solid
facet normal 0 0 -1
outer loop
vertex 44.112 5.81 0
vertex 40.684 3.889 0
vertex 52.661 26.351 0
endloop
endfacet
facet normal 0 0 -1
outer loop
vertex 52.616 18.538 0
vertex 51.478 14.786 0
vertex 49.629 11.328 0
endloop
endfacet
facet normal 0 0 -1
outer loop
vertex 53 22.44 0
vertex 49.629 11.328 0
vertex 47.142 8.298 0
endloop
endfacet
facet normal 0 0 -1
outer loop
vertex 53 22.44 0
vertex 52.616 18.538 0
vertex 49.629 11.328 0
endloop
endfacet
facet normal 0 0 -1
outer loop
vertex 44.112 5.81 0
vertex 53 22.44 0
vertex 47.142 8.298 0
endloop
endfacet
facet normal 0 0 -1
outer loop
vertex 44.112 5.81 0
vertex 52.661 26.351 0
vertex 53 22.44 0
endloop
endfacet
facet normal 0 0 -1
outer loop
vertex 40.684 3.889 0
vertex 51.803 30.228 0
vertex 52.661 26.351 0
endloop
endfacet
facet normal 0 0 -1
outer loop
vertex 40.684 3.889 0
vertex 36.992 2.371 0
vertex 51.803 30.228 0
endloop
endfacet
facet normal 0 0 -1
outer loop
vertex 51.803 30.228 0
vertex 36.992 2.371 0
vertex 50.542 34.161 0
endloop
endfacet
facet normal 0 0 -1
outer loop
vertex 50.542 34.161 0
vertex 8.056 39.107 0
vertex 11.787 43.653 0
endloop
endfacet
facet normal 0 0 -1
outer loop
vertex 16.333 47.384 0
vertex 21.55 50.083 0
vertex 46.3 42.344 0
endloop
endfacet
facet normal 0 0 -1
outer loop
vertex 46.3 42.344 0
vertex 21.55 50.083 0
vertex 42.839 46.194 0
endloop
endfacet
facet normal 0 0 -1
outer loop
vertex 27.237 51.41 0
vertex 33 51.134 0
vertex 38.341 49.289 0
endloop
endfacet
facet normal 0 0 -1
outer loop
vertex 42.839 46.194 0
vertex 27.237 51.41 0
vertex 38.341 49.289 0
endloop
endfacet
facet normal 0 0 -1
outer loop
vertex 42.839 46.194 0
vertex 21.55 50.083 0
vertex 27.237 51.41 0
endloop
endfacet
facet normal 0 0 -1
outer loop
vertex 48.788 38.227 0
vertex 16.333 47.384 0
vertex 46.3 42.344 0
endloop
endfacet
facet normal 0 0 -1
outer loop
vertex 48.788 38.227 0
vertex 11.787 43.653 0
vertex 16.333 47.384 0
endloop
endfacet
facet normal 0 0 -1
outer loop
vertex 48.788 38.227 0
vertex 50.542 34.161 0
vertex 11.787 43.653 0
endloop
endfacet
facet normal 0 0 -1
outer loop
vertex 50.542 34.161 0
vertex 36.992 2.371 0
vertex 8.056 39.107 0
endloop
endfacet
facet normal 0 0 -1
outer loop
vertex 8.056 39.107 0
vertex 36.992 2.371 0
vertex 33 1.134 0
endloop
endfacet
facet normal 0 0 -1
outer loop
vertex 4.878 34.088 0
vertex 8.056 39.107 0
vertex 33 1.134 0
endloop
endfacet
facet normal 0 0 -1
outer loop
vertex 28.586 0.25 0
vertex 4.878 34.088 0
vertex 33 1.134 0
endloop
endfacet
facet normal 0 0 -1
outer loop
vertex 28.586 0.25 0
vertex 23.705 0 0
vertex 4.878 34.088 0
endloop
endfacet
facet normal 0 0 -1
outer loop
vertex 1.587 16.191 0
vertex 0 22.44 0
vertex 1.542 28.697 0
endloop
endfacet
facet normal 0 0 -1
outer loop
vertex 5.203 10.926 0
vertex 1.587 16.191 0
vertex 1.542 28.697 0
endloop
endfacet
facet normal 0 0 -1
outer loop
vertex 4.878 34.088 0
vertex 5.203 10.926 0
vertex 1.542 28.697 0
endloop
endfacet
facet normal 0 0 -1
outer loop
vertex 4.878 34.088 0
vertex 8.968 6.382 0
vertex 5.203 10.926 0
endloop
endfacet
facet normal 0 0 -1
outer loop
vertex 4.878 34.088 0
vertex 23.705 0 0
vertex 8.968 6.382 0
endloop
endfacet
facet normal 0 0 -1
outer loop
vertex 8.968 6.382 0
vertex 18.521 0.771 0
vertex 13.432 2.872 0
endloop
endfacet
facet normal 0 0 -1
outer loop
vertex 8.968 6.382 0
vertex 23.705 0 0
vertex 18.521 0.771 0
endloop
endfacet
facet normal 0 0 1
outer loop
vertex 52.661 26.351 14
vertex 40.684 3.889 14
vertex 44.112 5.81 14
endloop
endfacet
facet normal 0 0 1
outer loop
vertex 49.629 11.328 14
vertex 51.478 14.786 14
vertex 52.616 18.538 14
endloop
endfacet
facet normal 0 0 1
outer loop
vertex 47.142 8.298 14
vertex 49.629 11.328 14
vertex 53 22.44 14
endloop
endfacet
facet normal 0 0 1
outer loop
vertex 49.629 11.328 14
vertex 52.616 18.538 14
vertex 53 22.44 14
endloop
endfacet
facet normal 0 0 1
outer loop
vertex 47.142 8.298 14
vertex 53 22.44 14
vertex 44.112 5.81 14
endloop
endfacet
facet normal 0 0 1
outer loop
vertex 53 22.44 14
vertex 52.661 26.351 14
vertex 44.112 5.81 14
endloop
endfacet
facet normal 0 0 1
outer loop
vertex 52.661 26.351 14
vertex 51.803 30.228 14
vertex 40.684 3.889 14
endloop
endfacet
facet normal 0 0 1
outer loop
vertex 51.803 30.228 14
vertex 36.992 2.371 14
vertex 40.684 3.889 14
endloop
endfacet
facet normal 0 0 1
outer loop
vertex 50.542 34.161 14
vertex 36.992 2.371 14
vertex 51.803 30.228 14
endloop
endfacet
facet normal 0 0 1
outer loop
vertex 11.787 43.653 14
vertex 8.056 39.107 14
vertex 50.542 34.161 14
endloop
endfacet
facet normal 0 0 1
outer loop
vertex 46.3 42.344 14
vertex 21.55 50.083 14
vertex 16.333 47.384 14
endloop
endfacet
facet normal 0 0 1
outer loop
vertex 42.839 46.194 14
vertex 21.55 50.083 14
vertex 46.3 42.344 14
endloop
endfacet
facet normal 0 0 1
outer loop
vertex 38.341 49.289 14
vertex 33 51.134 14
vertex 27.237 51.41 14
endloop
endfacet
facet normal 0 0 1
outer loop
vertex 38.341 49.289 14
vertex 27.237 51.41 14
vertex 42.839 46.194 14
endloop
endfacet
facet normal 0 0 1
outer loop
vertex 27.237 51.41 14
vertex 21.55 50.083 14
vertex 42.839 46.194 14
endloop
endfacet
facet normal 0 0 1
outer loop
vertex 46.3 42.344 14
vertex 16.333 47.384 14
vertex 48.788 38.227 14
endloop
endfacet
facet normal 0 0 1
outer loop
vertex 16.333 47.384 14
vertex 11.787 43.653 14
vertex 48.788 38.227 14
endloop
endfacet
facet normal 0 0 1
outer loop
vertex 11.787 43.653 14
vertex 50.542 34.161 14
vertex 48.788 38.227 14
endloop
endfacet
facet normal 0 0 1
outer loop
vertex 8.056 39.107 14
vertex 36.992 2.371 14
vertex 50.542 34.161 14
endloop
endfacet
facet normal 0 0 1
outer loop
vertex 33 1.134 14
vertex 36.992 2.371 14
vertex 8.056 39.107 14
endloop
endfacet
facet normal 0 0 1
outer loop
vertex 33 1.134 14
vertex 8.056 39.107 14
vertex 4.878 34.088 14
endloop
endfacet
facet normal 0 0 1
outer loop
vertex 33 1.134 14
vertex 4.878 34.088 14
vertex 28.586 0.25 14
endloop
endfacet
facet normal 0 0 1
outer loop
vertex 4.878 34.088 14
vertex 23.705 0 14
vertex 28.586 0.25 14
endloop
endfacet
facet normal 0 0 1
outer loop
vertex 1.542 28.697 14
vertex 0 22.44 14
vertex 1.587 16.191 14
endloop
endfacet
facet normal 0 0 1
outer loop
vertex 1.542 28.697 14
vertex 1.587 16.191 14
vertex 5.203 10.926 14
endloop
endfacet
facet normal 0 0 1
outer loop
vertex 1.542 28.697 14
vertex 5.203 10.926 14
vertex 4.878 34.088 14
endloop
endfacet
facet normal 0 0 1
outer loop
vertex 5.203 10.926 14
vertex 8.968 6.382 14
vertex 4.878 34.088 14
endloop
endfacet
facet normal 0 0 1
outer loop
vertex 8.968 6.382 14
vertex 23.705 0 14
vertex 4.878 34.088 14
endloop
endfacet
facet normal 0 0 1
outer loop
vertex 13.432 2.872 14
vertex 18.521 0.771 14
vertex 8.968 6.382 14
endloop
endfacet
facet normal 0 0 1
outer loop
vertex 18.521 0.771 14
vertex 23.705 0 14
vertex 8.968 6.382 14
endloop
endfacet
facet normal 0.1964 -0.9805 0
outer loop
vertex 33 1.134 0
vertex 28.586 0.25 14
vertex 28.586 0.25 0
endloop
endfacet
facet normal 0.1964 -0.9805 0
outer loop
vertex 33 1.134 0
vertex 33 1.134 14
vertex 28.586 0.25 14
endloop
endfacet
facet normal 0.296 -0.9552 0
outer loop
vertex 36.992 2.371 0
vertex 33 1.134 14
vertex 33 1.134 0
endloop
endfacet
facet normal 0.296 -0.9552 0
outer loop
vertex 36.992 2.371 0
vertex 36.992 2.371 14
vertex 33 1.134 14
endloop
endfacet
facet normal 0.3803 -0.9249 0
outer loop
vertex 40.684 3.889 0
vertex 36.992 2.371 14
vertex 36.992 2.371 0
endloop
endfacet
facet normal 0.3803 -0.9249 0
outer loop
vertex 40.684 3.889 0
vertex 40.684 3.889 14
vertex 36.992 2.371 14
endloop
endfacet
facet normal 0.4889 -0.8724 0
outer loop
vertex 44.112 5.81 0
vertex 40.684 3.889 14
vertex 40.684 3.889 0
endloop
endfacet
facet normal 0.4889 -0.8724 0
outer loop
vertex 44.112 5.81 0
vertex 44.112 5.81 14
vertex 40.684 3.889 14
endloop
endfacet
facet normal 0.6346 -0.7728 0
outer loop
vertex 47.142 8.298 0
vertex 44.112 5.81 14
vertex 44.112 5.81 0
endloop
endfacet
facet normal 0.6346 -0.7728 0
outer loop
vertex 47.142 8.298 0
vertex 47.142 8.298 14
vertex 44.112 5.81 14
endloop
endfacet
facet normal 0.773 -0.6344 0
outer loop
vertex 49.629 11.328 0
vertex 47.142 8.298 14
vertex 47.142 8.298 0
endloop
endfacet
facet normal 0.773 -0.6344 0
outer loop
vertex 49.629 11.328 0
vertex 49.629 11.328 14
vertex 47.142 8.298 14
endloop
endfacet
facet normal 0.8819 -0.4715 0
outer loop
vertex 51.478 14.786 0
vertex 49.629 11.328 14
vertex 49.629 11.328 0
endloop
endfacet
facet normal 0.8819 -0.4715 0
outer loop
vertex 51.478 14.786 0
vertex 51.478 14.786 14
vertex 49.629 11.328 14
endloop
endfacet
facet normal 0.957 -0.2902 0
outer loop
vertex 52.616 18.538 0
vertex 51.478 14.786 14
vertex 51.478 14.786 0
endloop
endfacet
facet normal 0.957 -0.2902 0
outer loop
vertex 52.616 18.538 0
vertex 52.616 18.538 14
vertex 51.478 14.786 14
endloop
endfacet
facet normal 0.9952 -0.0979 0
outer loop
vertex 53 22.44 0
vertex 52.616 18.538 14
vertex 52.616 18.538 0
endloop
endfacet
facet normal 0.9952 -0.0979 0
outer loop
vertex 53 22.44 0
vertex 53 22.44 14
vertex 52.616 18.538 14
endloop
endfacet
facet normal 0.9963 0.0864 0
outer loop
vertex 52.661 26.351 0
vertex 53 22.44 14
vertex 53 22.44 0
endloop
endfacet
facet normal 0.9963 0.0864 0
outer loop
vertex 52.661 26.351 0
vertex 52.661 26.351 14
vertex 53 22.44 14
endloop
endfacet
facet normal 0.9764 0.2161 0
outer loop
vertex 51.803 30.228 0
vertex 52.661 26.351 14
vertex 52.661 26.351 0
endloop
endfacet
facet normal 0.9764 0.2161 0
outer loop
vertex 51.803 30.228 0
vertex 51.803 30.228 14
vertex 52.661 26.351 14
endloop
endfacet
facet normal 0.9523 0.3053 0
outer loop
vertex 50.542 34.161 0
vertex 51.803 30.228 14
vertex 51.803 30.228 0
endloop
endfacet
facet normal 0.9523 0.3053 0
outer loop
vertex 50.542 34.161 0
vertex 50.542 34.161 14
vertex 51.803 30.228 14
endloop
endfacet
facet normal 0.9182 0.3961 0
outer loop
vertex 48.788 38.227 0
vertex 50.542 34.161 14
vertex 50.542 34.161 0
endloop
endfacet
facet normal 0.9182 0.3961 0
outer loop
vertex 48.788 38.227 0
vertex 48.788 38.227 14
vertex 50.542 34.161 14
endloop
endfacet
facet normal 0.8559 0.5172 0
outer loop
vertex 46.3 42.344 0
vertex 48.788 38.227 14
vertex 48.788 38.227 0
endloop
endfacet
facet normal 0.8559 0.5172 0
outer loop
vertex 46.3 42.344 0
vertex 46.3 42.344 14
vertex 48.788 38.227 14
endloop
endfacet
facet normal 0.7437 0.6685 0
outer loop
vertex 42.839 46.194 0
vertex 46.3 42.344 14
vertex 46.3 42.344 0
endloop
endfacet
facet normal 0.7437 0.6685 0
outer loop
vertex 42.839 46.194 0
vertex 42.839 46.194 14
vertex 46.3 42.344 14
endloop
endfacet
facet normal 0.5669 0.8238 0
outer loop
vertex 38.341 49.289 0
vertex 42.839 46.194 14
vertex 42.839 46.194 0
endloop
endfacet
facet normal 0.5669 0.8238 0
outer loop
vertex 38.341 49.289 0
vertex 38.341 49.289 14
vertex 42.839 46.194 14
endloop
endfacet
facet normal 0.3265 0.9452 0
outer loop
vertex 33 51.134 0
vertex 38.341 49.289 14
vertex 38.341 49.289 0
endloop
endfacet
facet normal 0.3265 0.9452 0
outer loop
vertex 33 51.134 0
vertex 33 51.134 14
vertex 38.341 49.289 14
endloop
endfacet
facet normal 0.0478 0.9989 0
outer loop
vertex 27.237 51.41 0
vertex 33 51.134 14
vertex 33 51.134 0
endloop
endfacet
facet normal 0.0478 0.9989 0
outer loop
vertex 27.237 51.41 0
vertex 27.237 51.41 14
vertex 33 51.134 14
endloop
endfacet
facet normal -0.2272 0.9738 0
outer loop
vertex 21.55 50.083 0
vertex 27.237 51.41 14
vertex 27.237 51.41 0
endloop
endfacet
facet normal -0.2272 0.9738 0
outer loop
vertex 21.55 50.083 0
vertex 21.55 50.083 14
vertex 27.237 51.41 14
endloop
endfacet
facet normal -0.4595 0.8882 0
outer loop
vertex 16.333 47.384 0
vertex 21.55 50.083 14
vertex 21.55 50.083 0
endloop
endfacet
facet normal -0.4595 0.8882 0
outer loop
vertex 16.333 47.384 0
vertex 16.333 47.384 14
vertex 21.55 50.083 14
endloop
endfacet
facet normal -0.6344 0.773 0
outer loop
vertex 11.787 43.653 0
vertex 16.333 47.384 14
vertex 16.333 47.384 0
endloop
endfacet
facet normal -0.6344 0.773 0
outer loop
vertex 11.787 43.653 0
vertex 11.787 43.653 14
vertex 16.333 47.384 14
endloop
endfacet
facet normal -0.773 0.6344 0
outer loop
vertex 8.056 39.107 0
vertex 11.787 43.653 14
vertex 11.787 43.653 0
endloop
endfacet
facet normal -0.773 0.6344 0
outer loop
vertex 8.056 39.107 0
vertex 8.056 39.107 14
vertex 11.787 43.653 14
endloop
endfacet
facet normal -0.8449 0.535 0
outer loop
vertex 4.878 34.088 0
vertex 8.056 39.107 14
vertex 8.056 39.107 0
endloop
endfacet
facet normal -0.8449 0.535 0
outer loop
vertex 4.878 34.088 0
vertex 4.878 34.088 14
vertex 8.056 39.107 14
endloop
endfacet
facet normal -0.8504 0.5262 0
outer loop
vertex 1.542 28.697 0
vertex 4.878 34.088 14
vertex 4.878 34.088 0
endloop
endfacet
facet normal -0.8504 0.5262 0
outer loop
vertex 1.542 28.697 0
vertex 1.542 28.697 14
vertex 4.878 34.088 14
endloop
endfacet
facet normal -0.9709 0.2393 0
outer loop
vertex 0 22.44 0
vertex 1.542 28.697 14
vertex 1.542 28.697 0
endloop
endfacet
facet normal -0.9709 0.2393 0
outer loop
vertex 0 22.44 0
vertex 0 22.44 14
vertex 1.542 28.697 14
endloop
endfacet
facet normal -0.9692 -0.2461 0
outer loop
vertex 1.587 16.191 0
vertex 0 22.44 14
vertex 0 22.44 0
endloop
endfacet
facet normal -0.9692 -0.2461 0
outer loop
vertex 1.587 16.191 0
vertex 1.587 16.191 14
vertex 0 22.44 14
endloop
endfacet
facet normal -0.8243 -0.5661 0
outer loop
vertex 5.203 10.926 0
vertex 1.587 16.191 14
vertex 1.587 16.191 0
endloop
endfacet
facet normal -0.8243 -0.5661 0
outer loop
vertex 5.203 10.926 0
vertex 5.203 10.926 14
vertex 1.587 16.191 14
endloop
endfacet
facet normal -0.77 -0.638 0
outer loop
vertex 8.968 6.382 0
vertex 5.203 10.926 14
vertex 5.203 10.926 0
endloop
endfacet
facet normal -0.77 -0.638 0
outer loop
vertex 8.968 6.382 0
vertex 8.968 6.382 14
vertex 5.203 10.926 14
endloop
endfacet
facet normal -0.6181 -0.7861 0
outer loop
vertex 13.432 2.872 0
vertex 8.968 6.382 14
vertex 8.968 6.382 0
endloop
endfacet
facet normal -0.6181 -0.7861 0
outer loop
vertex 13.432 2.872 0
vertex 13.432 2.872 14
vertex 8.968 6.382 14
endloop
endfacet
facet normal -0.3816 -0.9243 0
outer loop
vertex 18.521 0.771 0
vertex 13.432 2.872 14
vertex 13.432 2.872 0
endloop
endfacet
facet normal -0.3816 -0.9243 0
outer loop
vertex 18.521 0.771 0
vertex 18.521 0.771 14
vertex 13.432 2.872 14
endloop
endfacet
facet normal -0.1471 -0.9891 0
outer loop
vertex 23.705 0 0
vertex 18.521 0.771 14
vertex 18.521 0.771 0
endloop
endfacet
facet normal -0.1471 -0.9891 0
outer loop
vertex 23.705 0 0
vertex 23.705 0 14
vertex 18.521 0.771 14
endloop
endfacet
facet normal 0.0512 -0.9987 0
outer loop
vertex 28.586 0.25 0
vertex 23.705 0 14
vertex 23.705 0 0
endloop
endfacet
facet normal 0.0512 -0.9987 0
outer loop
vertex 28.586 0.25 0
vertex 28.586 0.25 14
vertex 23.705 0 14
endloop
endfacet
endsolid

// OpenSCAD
$fn = 32;

// ----------------------------------------------------------------------
// Cam disc: base radius 20.0 mm, lift 10.0 mm, 32 profile points
// ----------------------------------------------------------------------

// --- parameters (mm) ---
profile_height = 14;      // extrusion height
profile_points = 32;      // points of the closed outline

profile = [[53, 22.44], [52.661, 26.351], [51.803, 30.228], [50.542, 34.161], [48.788, 38.227], [46.3, 42.344], [42.839, 46.194], [38.341, 49.289], [33, 51.134], [27.237, 51.41], [21.55, 50.083], [16.333, 47.384], [11.787, 43.653], [8.056, 39.107], [4.878, 34.088], [1.542, 28.697], [0, 22.44], [1.587, 16.191], [5.203, 10.926], [8.968, 6.382], [13.432, 2.872], [18.521, 0.771], [23.705, 0], [28.586, 0.25], [33, 1.134], [36.992, 2.371], [40.684, 3.889], [44.112, 5.81], [47.142, 8.298], [49.629, 11.328], [51.478, 14.786], [52.616, 18.538]];  // single closed polygon, 32 points, counter clockwise

// --- the one profile operation ---
linear_extrude(height = profile_height) polygon(points = profile);
